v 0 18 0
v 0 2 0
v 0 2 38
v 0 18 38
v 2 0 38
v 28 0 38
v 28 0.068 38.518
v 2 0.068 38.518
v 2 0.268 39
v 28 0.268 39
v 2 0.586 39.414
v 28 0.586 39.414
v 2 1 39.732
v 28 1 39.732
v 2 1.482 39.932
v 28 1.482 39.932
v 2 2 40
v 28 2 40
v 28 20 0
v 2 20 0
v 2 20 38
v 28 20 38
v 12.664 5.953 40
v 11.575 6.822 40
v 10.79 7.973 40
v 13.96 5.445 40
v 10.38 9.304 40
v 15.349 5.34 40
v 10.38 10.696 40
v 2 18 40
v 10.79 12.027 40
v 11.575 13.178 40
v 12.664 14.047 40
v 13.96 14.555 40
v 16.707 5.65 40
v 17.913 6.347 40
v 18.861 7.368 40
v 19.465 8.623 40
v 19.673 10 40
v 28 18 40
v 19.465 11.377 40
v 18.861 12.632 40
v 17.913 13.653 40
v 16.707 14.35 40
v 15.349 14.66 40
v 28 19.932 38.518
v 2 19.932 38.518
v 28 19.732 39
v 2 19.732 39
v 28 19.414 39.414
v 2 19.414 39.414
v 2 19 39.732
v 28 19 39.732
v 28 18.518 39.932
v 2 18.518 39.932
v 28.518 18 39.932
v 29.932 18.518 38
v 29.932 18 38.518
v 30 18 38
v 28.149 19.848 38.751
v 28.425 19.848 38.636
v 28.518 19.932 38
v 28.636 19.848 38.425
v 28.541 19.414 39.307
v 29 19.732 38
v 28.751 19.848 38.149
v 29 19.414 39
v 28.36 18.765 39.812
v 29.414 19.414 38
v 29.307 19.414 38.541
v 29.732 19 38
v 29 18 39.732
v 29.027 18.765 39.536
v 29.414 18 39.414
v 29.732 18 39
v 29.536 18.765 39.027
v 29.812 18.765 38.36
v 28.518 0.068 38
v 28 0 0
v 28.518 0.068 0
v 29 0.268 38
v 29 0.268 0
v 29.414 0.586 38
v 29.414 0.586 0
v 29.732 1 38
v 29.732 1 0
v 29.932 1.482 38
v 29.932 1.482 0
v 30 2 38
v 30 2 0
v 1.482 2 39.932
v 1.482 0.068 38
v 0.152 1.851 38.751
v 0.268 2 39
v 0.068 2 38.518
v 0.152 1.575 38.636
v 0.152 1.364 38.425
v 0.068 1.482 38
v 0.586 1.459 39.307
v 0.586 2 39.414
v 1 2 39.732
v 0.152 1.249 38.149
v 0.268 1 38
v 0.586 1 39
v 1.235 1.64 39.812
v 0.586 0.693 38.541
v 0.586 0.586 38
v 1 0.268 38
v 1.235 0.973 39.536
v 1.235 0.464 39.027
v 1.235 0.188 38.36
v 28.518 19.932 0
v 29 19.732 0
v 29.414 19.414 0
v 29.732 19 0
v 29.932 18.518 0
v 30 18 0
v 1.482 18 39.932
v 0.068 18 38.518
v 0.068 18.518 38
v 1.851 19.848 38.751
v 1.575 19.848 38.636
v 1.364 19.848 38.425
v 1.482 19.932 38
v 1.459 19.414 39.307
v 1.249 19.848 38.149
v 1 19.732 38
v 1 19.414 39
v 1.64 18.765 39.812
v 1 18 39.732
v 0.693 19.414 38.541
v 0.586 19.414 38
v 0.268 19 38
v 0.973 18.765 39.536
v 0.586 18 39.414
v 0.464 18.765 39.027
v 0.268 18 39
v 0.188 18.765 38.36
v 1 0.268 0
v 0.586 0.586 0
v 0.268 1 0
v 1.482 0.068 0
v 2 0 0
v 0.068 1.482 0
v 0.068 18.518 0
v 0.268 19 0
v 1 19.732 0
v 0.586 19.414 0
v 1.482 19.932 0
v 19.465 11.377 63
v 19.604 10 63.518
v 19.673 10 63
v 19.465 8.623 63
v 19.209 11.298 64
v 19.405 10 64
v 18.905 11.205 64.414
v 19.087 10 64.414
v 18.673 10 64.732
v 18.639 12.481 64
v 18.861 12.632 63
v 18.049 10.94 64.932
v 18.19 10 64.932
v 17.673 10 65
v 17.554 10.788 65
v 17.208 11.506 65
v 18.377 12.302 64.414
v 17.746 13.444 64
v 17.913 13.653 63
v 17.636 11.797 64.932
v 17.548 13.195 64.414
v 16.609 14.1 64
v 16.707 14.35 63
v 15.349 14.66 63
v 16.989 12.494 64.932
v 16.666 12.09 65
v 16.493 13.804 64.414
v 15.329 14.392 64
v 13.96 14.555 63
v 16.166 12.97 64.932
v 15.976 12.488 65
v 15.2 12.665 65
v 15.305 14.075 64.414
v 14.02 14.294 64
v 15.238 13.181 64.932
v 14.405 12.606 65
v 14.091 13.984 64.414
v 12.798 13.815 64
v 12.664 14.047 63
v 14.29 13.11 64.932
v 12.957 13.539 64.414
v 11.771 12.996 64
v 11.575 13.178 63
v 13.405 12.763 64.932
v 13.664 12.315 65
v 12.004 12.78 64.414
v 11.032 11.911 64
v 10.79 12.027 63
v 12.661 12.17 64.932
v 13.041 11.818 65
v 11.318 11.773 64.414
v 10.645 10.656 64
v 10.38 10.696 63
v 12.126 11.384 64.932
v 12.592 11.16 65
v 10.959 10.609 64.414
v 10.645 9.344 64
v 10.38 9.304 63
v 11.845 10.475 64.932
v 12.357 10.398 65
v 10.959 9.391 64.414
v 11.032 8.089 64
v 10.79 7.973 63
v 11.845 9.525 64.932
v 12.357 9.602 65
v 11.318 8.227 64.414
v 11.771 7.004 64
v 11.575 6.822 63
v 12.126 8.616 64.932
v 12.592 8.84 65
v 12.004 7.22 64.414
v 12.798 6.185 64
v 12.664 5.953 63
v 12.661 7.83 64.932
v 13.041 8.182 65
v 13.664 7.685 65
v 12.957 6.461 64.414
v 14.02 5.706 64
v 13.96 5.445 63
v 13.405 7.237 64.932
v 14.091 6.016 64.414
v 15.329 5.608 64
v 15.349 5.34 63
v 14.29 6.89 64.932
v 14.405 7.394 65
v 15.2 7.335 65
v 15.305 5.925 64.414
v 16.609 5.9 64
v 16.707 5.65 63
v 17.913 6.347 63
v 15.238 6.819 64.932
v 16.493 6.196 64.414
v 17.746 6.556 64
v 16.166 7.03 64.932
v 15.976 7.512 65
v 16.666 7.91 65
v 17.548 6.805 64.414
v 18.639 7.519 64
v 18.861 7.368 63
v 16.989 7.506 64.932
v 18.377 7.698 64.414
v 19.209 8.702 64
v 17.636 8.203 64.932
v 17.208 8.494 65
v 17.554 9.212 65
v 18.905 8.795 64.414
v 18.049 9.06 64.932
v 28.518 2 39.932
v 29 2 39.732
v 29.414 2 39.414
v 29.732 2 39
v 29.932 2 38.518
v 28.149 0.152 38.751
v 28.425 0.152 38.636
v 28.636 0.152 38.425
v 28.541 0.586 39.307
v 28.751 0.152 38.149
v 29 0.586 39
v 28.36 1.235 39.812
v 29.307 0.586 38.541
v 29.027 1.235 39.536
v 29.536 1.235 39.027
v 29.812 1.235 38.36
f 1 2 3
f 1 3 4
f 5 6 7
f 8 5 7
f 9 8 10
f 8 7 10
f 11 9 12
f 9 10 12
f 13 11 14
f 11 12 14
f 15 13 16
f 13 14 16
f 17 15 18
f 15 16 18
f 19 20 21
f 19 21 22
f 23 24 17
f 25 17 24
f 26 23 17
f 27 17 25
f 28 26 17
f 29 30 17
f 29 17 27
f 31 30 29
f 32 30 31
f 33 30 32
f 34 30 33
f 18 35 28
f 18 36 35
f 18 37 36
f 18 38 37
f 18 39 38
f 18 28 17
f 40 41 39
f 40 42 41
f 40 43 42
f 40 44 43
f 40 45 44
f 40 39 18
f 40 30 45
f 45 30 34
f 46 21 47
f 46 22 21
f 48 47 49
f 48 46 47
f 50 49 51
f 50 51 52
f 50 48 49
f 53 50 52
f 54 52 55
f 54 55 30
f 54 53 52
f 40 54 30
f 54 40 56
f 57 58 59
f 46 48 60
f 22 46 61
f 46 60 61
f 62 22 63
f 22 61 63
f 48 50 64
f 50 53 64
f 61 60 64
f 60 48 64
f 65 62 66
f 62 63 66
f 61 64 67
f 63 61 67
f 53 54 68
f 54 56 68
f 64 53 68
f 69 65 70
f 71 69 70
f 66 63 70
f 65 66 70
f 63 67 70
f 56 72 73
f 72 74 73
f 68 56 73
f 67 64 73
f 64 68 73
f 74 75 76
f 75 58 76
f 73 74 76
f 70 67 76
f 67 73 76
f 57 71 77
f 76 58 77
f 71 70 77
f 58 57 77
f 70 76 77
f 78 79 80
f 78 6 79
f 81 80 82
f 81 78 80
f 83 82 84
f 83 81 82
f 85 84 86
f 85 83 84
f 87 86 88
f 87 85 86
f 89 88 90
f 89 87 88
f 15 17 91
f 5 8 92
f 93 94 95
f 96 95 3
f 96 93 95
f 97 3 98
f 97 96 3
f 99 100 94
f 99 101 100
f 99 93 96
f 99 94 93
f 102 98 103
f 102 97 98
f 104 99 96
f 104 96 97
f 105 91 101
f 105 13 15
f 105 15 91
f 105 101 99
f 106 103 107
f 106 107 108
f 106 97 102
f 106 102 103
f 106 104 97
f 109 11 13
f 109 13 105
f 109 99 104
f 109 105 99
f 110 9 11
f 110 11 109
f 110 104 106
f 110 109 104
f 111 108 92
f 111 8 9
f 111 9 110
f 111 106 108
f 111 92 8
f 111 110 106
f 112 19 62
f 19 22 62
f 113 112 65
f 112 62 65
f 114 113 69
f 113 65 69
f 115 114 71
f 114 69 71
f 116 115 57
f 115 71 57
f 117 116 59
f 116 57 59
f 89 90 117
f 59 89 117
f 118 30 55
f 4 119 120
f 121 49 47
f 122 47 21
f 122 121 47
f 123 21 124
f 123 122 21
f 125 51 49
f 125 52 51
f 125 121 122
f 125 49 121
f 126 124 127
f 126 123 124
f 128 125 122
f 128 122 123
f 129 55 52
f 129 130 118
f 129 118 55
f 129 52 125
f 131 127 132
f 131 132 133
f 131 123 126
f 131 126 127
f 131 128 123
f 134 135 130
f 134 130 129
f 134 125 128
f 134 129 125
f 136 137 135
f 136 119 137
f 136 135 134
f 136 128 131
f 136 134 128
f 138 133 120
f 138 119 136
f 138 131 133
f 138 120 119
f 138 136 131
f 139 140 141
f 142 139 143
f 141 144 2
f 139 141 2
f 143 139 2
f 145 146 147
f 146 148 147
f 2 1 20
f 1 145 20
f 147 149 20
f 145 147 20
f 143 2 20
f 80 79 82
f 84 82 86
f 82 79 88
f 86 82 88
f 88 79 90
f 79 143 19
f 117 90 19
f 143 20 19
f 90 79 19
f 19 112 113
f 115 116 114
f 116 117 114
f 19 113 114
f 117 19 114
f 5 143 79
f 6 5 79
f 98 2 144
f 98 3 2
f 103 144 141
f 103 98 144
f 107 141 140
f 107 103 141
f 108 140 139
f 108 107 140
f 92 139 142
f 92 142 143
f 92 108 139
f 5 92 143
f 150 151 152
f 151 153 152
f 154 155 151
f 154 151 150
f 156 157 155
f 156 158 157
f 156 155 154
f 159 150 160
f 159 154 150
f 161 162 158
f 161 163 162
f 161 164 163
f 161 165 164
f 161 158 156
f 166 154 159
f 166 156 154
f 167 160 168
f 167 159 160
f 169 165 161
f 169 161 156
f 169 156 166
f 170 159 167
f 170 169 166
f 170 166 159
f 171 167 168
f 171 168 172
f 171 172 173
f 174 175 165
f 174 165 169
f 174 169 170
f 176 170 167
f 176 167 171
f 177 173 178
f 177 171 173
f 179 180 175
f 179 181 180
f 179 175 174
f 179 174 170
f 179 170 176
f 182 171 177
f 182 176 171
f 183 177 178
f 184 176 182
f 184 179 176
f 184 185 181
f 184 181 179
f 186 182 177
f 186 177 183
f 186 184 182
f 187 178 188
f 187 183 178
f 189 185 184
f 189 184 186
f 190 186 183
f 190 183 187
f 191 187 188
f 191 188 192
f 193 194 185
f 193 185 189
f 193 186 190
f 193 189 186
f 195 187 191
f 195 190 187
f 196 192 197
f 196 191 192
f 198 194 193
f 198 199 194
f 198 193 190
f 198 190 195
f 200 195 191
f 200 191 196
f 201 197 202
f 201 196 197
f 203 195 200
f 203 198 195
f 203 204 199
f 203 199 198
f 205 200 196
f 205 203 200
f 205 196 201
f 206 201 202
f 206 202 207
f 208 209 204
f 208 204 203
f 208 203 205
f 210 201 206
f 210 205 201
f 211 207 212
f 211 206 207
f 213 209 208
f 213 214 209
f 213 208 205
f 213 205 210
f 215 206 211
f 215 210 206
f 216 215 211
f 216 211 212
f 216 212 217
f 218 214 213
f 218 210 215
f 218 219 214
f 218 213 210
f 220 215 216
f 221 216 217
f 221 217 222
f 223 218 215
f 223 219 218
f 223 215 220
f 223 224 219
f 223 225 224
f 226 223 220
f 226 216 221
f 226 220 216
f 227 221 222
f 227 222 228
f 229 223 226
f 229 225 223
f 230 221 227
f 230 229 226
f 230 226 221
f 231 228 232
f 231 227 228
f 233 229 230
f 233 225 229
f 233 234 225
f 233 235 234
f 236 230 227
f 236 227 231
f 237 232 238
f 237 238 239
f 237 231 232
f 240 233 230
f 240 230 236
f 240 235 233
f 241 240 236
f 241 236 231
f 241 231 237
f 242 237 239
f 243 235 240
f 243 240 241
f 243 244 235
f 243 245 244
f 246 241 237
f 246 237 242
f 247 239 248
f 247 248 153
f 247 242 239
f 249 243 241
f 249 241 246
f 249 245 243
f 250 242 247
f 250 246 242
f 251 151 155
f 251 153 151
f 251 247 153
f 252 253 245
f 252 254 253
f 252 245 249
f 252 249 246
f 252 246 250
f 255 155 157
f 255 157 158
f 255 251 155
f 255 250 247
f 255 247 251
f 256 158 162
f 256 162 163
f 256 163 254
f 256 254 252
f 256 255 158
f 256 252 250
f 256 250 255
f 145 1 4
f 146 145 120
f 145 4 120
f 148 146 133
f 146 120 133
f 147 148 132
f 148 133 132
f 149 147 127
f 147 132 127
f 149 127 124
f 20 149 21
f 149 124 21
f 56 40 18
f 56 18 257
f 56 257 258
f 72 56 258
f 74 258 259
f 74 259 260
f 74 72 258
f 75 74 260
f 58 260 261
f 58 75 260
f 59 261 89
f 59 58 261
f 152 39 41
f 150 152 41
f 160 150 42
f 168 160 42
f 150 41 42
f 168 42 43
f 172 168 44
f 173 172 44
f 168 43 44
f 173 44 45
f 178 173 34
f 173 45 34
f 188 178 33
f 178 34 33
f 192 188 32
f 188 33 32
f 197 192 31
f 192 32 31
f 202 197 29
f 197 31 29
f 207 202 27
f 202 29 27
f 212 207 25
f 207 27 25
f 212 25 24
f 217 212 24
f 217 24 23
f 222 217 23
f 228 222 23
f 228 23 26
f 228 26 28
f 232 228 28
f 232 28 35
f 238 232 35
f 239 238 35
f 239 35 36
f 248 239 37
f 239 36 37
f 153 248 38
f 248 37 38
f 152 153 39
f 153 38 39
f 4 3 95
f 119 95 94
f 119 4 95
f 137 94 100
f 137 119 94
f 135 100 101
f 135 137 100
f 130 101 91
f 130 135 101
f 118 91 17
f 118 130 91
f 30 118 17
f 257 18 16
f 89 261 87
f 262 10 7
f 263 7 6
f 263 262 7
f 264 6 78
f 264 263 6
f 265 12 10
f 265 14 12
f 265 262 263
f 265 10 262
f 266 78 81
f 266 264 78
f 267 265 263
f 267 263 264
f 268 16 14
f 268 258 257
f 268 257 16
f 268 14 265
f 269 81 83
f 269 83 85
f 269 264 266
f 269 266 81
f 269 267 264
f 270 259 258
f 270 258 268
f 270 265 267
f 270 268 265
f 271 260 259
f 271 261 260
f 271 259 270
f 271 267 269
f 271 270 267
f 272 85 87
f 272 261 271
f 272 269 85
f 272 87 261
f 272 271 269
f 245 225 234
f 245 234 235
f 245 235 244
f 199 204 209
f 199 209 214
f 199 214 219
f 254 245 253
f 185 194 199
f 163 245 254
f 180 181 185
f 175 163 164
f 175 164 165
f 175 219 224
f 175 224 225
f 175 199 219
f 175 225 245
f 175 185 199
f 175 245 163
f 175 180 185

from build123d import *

# Parameters (mm, degrees)
F0_W     = 30
F0_H     = 20
F1_DEPTH = 40
F2_R     = 4.672603
F3_DEPTH = 25
F4_R     = 2


with BuildPart() as f1:
    # F0 (on Top) → F1 (new body)
    with BuildSketch(Plane.XY):
        with Locations((15, 10)):
            Rectangle(F0_W, F0_H)
    extrude(amount=F1_DEPTH)

    # F2 (on face) → F3 (join)
    with BuildSketch(Plane.XY.offset(40)):
        with Locations((15, 10)):
            Circle(F2_R)
    extrude(amount=F3_DEPTH)

    # F4
    f4_edges = [f1.edges().sort_by_distance(p)[0] for p in [
        (10.327397, 10, 65),
        (30, 10, 40),
        (15, 0, 40),
        (0, 10, 40),
        (15, 20, 40),
        (30, 20, 20),
        (30, 0, 20),
        (0, 0, 20),
        (0, 20, 20),
    ]]
    fillet(f4_edges, radius=F4_R)


solid = f1.part
